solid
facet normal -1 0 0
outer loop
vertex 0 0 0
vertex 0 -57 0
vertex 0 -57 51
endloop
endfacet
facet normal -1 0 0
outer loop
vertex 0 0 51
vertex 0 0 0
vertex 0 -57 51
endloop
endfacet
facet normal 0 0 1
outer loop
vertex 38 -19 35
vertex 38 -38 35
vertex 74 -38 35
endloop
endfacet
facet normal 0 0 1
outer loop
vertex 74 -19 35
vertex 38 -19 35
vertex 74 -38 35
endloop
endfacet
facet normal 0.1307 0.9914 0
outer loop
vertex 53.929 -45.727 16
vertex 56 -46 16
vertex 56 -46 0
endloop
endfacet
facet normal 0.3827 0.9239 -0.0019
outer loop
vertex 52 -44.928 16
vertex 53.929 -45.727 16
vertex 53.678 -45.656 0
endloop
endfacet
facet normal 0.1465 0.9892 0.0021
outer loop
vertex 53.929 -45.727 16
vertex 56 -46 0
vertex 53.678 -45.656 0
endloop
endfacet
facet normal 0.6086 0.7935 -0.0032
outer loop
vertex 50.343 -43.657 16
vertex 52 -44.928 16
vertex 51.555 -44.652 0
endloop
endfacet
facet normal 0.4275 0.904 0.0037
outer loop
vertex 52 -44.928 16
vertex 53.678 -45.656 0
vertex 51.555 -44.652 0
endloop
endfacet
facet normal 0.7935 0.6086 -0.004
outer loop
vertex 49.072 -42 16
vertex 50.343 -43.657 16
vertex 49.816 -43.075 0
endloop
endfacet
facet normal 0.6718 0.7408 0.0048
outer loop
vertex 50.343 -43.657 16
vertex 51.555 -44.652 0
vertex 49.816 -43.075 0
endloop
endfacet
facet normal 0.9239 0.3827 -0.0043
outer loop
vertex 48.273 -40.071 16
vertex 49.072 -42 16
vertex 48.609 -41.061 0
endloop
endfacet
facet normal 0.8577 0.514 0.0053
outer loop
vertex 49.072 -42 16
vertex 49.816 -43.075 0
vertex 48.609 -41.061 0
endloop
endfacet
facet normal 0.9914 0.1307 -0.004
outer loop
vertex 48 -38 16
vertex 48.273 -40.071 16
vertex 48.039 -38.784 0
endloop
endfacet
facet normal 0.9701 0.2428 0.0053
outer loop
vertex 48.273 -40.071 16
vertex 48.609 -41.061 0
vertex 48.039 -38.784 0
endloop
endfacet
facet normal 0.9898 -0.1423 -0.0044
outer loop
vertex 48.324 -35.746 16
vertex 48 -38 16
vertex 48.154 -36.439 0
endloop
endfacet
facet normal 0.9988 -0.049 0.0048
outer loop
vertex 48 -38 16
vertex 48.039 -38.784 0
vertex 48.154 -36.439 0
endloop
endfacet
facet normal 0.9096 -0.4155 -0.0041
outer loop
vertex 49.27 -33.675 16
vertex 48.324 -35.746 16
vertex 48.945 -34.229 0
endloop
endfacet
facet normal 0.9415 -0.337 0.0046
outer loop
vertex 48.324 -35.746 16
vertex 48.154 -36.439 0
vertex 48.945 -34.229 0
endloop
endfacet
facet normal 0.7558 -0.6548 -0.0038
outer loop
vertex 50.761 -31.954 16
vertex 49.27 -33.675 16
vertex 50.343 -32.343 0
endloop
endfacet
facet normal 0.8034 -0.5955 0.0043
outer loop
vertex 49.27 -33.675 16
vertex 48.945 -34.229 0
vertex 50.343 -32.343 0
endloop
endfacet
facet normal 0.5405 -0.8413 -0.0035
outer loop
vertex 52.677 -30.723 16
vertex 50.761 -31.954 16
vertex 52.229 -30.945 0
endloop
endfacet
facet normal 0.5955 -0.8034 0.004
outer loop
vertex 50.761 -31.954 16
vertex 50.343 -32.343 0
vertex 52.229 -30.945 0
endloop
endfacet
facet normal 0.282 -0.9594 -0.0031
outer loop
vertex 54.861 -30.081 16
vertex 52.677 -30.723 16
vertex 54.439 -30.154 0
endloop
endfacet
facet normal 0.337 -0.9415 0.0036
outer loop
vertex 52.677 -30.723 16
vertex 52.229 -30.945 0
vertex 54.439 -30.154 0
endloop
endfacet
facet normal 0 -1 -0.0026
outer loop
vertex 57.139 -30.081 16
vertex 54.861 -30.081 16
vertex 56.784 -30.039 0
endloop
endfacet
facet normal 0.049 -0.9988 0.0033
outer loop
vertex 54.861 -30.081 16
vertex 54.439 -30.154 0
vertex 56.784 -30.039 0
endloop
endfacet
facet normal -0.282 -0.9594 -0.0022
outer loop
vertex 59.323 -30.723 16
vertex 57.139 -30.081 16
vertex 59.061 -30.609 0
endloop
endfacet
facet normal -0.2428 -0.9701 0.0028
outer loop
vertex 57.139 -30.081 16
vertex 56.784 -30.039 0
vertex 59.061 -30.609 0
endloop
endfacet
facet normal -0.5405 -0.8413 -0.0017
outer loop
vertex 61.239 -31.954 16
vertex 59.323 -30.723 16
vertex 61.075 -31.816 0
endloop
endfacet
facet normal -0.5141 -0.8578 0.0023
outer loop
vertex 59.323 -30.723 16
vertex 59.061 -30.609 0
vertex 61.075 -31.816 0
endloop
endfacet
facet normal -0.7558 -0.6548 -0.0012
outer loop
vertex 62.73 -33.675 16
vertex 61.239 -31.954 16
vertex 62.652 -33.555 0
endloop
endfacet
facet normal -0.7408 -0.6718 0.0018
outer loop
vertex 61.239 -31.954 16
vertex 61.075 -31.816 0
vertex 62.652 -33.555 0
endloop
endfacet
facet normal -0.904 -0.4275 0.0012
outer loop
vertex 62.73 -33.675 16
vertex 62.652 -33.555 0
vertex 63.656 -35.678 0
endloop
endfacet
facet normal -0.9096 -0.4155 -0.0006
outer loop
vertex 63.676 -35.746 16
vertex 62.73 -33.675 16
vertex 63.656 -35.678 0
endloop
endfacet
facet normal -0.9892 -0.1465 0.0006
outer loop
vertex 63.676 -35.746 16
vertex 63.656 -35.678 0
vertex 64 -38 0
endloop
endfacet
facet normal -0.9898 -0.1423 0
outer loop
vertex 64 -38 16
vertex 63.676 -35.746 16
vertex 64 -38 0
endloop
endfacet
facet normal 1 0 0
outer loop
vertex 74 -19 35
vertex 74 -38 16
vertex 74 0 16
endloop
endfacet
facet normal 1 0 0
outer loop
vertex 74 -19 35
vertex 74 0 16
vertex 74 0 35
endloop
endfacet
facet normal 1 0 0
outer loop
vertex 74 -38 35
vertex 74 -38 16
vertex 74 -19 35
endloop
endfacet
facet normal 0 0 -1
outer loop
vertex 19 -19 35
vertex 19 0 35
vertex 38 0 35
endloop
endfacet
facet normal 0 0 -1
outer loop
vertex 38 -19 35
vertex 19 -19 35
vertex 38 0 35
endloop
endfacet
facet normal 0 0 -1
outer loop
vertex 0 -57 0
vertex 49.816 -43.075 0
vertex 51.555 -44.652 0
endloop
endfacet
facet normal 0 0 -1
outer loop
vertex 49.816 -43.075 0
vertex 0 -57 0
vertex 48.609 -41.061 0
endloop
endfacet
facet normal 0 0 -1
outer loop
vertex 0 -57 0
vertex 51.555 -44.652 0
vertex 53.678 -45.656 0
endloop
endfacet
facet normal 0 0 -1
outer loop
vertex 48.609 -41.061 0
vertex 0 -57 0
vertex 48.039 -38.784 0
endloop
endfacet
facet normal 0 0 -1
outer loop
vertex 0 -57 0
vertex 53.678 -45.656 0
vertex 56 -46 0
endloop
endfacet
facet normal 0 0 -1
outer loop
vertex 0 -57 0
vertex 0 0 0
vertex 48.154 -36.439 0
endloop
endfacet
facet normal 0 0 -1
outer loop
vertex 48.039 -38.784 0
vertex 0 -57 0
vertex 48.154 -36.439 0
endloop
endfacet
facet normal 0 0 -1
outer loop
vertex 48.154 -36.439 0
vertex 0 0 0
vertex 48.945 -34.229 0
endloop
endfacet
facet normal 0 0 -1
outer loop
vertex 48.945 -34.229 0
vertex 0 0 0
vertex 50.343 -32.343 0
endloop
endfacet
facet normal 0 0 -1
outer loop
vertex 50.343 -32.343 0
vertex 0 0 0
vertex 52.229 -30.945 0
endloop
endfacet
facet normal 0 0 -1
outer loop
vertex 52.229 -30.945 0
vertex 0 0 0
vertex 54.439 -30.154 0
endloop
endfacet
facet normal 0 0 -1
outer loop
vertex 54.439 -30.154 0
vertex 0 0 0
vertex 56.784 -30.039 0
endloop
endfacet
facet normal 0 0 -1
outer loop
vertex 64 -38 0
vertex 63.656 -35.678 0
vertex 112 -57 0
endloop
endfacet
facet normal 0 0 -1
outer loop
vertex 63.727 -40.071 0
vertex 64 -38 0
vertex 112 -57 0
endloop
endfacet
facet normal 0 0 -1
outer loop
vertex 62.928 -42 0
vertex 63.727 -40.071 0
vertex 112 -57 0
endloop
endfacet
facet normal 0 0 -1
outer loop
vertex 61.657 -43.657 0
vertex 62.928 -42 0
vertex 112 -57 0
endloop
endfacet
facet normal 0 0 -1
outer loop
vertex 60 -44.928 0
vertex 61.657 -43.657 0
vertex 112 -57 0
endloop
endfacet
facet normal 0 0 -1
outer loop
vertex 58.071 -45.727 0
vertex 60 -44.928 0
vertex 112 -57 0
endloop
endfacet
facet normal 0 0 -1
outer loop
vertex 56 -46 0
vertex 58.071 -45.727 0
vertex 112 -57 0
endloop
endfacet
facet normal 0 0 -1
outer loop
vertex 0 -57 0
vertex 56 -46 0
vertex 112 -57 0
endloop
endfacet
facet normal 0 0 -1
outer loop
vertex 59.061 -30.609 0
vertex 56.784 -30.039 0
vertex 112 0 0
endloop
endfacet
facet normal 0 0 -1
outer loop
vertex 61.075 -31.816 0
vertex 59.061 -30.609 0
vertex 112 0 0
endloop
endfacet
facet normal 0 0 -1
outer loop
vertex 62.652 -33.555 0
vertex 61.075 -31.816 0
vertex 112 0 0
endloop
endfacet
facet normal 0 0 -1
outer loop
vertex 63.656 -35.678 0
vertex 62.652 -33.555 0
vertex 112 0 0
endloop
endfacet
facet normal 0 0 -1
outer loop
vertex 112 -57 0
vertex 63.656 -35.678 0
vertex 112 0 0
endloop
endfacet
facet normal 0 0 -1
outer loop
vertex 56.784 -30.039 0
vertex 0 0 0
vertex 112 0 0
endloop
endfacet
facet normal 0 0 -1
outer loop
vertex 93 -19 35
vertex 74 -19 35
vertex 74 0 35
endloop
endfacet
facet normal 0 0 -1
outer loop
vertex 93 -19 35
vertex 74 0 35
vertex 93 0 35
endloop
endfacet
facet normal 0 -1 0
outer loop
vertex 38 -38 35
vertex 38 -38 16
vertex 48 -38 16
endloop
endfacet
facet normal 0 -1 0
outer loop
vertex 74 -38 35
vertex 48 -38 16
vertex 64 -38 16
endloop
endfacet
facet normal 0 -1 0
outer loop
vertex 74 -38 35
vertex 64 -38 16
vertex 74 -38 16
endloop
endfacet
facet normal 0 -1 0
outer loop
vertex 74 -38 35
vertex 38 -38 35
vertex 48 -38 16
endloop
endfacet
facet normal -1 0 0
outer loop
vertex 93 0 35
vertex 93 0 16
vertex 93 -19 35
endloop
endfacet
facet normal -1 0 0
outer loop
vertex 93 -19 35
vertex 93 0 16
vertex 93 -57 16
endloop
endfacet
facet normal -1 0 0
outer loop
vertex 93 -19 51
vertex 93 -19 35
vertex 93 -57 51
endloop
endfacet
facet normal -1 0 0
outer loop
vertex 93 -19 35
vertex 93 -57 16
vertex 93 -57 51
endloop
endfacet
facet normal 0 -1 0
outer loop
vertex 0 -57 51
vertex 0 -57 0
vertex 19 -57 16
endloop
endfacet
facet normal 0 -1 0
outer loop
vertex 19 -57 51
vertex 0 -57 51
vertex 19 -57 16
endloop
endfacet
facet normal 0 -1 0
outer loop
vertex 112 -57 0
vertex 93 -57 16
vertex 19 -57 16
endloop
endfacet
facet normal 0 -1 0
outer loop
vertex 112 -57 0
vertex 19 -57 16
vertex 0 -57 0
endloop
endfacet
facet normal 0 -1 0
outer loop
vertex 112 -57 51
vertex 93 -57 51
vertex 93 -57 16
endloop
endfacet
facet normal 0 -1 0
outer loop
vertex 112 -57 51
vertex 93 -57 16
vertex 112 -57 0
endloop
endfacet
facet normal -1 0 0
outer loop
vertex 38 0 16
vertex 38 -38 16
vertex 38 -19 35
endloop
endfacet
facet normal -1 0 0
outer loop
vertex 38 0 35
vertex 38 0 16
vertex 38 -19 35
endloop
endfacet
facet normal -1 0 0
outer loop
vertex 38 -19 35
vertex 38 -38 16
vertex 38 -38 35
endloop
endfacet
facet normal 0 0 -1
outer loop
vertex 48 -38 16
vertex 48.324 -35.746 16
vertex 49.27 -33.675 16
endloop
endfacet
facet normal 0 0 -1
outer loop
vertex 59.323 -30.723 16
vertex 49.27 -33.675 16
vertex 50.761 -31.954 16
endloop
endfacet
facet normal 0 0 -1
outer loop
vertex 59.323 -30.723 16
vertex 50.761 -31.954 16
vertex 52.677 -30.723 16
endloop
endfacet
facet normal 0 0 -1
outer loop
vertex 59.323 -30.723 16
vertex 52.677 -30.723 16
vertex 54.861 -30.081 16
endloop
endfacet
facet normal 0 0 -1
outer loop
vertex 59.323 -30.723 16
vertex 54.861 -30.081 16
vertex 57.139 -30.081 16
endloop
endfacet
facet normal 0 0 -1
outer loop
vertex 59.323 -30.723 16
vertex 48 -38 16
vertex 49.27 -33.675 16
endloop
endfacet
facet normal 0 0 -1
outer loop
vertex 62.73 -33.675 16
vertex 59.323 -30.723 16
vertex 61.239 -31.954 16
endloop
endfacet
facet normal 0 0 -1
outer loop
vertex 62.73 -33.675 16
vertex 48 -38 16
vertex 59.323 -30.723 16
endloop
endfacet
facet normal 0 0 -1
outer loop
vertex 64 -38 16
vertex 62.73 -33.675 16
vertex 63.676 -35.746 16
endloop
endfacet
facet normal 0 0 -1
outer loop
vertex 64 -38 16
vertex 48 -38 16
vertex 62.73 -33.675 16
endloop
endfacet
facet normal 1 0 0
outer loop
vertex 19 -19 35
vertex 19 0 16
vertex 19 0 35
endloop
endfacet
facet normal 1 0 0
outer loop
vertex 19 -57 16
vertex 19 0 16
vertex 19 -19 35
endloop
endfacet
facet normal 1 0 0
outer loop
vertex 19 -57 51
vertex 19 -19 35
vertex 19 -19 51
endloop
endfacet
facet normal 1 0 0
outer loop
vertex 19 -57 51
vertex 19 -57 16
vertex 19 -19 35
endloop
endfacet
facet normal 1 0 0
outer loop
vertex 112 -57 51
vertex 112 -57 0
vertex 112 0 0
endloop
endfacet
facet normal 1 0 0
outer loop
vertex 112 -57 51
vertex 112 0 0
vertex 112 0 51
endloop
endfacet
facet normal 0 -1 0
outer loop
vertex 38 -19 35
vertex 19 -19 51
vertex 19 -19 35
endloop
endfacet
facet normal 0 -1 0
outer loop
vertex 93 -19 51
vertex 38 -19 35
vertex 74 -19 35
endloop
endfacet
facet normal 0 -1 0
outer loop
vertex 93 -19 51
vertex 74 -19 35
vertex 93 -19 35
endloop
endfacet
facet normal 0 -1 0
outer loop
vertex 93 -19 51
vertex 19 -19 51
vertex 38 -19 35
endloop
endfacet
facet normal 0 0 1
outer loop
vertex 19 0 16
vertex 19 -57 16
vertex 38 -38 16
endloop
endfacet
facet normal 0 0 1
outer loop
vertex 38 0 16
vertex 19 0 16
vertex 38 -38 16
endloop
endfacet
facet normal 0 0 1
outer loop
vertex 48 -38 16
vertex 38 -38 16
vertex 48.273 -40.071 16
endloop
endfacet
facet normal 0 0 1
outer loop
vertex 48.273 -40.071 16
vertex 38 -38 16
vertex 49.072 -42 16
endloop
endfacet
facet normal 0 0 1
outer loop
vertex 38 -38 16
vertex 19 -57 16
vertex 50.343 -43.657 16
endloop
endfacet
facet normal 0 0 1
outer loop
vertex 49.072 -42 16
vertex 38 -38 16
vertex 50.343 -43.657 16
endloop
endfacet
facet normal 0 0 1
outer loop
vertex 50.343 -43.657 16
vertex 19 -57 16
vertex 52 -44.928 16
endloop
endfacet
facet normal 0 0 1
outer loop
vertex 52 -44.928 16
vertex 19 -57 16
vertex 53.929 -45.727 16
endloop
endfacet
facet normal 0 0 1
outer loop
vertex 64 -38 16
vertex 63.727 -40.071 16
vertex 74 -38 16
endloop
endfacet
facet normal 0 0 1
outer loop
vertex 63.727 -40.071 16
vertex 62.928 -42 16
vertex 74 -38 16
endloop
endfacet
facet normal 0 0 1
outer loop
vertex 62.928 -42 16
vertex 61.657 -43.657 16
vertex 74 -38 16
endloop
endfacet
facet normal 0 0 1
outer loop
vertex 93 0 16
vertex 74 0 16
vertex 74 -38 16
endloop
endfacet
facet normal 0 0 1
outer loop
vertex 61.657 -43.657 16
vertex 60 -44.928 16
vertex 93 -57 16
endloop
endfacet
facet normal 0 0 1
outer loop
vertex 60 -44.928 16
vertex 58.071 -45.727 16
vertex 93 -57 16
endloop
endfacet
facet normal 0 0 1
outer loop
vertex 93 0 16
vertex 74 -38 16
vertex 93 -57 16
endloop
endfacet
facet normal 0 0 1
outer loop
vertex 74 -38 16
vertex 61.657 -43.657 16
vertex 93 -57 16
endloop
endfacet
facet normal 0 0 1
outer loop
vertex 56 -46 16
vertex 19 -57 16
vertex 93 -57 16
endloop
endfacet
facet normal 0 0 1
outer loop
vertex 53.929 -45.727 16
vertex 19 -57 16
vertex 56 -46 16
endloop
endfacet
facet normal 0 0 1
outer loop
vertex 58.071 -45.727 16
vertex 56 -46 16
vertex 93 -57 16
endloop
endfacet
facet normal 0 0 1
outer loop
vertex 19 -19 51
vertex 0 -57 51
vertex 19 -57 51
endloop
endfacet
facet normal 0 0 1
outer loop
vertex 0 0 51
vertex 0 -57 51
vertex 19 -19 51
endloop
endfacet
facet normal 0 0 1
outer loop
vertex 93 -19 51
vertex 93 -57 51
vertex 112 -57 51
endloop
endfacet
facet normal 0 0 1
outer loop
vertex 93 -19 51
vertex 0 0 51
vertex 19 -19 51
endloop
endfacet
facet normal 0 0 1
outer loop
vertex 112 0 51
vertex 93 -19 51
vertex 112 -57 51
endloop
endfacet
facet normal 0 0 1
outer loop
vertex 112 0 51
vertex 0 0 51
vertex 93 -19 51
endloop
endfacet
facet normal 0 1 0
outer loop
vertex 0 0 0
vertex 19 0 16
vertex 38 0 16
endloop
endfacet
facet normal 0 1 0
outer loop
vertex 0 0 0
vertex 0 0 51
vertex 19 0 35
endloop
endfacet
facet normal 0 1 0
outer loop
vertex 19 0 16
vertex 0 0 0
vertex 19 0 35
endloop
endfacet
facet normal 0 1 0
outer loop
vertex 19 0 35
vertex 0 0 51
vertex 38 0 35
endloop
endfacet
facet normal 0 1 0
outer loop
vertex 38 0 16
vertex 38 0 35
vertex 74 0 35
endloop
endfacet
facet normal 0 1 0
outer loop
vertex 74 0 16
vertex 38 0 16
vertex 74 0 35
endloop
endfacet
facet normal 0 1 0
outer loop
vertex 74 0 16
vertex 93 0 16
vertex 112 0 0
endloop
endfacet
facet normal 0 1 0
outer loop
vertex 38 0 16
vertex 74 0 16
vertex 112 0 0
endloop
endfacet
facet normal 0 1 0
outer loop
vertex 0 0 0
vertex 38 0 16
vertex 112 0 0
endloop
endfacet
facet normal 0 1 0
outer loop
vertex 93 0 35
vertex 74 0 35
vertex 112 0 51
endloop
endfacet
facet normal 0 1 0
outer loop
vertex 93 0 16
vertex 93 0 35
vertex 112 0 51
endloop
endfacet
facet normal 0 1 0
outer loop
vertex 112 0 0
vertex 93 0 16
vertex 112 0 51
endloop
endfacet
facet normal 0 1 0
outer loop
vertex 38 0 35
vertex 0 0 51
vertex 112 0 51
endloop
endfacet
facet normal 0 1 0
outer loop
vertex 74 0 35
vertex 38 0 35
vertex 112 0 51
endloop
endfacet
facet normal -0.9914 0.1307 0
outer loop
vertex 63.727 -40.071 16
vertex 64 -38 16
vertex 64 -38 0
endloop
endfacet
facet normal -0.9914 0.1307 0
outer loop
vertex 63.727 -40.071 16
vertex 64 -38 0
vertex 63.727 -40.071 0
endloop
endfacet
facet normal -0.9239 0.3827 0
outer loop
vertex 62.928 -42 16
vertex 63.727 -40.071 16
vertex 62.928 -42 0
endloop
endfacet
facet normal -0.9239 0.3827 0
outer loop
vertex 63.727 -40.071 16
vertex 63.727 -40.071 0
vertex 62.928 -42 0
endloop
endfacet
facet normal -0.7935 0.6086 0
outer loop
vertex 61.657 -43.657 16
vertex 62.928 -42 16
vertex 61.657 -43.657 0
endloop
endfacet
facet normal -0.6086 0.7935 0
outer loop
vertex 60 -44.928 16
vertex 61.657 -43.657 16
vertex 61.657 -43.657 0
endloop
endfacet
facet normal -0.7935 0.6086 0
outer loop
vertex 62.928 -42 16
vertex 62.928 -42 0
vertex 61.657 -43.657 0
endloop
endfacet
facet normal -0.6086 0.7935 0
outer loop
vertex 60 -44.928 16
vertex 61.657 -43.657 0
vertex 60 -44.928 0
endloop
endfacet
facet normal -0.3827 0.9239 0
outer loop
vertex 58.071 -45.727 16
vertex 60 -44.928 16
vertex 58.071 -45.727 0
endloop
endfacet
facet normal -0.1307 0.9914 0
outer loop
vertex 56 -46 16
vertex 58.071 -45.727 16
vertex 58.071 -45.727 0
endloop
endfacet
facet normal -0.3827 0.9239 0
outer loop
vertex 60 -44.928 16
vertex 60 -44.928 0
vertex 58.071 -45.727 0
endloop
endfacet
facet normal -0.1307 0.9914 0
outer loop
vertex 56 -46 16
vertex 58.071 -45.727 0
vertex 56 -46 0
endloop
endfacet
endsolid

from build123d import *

# Parameters (mm, degrees)
F0_W     = 112
F0_H     = 51
F1_DEPTH = 57
F2_W     = 74
F2_H     = 16
F3_DEPTH = 38
F4_W     = 19
F4_H     = 19
F5_DEPTH = 57.001
F6_W     = 36
F6_H     = 19
F7_DEPTH = 19
F9_DEPTH = 16


with BuildPart() as f1:
    # F0 (on Front) → F1 (new body)
    with BuildSketch(Plane.XZ):
        with Locations((56, 25.5)):
            Rectangle(F0_W, F0_H)
    extrude(amount=F1_DEPTH)

    # F2 (on face) → F3 (cut)
    with BuildSketch(Plane.XZ.offset(57)):
        with Locations((56, 43)):
            Rectangle(F2_W, F2_H)
    extrude(amount=-F3_DEPTH, mode=Mode.SUBTRACT)

    # F4 (on face) → F5 (cut, through all)
    with BuildSketch(Plane.XZ.offset(57)):
        with Locations((28.5, 25.5)):
            Rectangle(F4_W, F4_H)
        with Locations((83.5, 25.5)):
            Rectangle(F4_W, F4_H)
    extrude(amount=-F5_DEPTH, mode=Mode.SUBTRACT)

    # F6 (on face) → F7 (cut)
    with BuildSketch(Plane.XZ.offset(57)):
        with Locations((56, 25.5)):
            Rectangle(F6_W, F6_H)
    extrude(amount=-F7_DEPTH, mode=Mode.SUBTRACT)

    # F8 (on face) → F9 (cut)
    with BuildSketch(Plane(origin=(0, 0, 0), x_dir=(1, 0, 0), z_dir=(0, 0, -1))):
        with BuildLine():
            ThreePointArc((64, 38), (61.656854, 43.656854), (56, 46))
            ThreePointArc((56, 46), (50.343146, 32.343146), (64, 38))
        make_face()
    extrude(amount=-F9_DEPTH, mode=Mode.SUBTRACT)


solid = f1.part
